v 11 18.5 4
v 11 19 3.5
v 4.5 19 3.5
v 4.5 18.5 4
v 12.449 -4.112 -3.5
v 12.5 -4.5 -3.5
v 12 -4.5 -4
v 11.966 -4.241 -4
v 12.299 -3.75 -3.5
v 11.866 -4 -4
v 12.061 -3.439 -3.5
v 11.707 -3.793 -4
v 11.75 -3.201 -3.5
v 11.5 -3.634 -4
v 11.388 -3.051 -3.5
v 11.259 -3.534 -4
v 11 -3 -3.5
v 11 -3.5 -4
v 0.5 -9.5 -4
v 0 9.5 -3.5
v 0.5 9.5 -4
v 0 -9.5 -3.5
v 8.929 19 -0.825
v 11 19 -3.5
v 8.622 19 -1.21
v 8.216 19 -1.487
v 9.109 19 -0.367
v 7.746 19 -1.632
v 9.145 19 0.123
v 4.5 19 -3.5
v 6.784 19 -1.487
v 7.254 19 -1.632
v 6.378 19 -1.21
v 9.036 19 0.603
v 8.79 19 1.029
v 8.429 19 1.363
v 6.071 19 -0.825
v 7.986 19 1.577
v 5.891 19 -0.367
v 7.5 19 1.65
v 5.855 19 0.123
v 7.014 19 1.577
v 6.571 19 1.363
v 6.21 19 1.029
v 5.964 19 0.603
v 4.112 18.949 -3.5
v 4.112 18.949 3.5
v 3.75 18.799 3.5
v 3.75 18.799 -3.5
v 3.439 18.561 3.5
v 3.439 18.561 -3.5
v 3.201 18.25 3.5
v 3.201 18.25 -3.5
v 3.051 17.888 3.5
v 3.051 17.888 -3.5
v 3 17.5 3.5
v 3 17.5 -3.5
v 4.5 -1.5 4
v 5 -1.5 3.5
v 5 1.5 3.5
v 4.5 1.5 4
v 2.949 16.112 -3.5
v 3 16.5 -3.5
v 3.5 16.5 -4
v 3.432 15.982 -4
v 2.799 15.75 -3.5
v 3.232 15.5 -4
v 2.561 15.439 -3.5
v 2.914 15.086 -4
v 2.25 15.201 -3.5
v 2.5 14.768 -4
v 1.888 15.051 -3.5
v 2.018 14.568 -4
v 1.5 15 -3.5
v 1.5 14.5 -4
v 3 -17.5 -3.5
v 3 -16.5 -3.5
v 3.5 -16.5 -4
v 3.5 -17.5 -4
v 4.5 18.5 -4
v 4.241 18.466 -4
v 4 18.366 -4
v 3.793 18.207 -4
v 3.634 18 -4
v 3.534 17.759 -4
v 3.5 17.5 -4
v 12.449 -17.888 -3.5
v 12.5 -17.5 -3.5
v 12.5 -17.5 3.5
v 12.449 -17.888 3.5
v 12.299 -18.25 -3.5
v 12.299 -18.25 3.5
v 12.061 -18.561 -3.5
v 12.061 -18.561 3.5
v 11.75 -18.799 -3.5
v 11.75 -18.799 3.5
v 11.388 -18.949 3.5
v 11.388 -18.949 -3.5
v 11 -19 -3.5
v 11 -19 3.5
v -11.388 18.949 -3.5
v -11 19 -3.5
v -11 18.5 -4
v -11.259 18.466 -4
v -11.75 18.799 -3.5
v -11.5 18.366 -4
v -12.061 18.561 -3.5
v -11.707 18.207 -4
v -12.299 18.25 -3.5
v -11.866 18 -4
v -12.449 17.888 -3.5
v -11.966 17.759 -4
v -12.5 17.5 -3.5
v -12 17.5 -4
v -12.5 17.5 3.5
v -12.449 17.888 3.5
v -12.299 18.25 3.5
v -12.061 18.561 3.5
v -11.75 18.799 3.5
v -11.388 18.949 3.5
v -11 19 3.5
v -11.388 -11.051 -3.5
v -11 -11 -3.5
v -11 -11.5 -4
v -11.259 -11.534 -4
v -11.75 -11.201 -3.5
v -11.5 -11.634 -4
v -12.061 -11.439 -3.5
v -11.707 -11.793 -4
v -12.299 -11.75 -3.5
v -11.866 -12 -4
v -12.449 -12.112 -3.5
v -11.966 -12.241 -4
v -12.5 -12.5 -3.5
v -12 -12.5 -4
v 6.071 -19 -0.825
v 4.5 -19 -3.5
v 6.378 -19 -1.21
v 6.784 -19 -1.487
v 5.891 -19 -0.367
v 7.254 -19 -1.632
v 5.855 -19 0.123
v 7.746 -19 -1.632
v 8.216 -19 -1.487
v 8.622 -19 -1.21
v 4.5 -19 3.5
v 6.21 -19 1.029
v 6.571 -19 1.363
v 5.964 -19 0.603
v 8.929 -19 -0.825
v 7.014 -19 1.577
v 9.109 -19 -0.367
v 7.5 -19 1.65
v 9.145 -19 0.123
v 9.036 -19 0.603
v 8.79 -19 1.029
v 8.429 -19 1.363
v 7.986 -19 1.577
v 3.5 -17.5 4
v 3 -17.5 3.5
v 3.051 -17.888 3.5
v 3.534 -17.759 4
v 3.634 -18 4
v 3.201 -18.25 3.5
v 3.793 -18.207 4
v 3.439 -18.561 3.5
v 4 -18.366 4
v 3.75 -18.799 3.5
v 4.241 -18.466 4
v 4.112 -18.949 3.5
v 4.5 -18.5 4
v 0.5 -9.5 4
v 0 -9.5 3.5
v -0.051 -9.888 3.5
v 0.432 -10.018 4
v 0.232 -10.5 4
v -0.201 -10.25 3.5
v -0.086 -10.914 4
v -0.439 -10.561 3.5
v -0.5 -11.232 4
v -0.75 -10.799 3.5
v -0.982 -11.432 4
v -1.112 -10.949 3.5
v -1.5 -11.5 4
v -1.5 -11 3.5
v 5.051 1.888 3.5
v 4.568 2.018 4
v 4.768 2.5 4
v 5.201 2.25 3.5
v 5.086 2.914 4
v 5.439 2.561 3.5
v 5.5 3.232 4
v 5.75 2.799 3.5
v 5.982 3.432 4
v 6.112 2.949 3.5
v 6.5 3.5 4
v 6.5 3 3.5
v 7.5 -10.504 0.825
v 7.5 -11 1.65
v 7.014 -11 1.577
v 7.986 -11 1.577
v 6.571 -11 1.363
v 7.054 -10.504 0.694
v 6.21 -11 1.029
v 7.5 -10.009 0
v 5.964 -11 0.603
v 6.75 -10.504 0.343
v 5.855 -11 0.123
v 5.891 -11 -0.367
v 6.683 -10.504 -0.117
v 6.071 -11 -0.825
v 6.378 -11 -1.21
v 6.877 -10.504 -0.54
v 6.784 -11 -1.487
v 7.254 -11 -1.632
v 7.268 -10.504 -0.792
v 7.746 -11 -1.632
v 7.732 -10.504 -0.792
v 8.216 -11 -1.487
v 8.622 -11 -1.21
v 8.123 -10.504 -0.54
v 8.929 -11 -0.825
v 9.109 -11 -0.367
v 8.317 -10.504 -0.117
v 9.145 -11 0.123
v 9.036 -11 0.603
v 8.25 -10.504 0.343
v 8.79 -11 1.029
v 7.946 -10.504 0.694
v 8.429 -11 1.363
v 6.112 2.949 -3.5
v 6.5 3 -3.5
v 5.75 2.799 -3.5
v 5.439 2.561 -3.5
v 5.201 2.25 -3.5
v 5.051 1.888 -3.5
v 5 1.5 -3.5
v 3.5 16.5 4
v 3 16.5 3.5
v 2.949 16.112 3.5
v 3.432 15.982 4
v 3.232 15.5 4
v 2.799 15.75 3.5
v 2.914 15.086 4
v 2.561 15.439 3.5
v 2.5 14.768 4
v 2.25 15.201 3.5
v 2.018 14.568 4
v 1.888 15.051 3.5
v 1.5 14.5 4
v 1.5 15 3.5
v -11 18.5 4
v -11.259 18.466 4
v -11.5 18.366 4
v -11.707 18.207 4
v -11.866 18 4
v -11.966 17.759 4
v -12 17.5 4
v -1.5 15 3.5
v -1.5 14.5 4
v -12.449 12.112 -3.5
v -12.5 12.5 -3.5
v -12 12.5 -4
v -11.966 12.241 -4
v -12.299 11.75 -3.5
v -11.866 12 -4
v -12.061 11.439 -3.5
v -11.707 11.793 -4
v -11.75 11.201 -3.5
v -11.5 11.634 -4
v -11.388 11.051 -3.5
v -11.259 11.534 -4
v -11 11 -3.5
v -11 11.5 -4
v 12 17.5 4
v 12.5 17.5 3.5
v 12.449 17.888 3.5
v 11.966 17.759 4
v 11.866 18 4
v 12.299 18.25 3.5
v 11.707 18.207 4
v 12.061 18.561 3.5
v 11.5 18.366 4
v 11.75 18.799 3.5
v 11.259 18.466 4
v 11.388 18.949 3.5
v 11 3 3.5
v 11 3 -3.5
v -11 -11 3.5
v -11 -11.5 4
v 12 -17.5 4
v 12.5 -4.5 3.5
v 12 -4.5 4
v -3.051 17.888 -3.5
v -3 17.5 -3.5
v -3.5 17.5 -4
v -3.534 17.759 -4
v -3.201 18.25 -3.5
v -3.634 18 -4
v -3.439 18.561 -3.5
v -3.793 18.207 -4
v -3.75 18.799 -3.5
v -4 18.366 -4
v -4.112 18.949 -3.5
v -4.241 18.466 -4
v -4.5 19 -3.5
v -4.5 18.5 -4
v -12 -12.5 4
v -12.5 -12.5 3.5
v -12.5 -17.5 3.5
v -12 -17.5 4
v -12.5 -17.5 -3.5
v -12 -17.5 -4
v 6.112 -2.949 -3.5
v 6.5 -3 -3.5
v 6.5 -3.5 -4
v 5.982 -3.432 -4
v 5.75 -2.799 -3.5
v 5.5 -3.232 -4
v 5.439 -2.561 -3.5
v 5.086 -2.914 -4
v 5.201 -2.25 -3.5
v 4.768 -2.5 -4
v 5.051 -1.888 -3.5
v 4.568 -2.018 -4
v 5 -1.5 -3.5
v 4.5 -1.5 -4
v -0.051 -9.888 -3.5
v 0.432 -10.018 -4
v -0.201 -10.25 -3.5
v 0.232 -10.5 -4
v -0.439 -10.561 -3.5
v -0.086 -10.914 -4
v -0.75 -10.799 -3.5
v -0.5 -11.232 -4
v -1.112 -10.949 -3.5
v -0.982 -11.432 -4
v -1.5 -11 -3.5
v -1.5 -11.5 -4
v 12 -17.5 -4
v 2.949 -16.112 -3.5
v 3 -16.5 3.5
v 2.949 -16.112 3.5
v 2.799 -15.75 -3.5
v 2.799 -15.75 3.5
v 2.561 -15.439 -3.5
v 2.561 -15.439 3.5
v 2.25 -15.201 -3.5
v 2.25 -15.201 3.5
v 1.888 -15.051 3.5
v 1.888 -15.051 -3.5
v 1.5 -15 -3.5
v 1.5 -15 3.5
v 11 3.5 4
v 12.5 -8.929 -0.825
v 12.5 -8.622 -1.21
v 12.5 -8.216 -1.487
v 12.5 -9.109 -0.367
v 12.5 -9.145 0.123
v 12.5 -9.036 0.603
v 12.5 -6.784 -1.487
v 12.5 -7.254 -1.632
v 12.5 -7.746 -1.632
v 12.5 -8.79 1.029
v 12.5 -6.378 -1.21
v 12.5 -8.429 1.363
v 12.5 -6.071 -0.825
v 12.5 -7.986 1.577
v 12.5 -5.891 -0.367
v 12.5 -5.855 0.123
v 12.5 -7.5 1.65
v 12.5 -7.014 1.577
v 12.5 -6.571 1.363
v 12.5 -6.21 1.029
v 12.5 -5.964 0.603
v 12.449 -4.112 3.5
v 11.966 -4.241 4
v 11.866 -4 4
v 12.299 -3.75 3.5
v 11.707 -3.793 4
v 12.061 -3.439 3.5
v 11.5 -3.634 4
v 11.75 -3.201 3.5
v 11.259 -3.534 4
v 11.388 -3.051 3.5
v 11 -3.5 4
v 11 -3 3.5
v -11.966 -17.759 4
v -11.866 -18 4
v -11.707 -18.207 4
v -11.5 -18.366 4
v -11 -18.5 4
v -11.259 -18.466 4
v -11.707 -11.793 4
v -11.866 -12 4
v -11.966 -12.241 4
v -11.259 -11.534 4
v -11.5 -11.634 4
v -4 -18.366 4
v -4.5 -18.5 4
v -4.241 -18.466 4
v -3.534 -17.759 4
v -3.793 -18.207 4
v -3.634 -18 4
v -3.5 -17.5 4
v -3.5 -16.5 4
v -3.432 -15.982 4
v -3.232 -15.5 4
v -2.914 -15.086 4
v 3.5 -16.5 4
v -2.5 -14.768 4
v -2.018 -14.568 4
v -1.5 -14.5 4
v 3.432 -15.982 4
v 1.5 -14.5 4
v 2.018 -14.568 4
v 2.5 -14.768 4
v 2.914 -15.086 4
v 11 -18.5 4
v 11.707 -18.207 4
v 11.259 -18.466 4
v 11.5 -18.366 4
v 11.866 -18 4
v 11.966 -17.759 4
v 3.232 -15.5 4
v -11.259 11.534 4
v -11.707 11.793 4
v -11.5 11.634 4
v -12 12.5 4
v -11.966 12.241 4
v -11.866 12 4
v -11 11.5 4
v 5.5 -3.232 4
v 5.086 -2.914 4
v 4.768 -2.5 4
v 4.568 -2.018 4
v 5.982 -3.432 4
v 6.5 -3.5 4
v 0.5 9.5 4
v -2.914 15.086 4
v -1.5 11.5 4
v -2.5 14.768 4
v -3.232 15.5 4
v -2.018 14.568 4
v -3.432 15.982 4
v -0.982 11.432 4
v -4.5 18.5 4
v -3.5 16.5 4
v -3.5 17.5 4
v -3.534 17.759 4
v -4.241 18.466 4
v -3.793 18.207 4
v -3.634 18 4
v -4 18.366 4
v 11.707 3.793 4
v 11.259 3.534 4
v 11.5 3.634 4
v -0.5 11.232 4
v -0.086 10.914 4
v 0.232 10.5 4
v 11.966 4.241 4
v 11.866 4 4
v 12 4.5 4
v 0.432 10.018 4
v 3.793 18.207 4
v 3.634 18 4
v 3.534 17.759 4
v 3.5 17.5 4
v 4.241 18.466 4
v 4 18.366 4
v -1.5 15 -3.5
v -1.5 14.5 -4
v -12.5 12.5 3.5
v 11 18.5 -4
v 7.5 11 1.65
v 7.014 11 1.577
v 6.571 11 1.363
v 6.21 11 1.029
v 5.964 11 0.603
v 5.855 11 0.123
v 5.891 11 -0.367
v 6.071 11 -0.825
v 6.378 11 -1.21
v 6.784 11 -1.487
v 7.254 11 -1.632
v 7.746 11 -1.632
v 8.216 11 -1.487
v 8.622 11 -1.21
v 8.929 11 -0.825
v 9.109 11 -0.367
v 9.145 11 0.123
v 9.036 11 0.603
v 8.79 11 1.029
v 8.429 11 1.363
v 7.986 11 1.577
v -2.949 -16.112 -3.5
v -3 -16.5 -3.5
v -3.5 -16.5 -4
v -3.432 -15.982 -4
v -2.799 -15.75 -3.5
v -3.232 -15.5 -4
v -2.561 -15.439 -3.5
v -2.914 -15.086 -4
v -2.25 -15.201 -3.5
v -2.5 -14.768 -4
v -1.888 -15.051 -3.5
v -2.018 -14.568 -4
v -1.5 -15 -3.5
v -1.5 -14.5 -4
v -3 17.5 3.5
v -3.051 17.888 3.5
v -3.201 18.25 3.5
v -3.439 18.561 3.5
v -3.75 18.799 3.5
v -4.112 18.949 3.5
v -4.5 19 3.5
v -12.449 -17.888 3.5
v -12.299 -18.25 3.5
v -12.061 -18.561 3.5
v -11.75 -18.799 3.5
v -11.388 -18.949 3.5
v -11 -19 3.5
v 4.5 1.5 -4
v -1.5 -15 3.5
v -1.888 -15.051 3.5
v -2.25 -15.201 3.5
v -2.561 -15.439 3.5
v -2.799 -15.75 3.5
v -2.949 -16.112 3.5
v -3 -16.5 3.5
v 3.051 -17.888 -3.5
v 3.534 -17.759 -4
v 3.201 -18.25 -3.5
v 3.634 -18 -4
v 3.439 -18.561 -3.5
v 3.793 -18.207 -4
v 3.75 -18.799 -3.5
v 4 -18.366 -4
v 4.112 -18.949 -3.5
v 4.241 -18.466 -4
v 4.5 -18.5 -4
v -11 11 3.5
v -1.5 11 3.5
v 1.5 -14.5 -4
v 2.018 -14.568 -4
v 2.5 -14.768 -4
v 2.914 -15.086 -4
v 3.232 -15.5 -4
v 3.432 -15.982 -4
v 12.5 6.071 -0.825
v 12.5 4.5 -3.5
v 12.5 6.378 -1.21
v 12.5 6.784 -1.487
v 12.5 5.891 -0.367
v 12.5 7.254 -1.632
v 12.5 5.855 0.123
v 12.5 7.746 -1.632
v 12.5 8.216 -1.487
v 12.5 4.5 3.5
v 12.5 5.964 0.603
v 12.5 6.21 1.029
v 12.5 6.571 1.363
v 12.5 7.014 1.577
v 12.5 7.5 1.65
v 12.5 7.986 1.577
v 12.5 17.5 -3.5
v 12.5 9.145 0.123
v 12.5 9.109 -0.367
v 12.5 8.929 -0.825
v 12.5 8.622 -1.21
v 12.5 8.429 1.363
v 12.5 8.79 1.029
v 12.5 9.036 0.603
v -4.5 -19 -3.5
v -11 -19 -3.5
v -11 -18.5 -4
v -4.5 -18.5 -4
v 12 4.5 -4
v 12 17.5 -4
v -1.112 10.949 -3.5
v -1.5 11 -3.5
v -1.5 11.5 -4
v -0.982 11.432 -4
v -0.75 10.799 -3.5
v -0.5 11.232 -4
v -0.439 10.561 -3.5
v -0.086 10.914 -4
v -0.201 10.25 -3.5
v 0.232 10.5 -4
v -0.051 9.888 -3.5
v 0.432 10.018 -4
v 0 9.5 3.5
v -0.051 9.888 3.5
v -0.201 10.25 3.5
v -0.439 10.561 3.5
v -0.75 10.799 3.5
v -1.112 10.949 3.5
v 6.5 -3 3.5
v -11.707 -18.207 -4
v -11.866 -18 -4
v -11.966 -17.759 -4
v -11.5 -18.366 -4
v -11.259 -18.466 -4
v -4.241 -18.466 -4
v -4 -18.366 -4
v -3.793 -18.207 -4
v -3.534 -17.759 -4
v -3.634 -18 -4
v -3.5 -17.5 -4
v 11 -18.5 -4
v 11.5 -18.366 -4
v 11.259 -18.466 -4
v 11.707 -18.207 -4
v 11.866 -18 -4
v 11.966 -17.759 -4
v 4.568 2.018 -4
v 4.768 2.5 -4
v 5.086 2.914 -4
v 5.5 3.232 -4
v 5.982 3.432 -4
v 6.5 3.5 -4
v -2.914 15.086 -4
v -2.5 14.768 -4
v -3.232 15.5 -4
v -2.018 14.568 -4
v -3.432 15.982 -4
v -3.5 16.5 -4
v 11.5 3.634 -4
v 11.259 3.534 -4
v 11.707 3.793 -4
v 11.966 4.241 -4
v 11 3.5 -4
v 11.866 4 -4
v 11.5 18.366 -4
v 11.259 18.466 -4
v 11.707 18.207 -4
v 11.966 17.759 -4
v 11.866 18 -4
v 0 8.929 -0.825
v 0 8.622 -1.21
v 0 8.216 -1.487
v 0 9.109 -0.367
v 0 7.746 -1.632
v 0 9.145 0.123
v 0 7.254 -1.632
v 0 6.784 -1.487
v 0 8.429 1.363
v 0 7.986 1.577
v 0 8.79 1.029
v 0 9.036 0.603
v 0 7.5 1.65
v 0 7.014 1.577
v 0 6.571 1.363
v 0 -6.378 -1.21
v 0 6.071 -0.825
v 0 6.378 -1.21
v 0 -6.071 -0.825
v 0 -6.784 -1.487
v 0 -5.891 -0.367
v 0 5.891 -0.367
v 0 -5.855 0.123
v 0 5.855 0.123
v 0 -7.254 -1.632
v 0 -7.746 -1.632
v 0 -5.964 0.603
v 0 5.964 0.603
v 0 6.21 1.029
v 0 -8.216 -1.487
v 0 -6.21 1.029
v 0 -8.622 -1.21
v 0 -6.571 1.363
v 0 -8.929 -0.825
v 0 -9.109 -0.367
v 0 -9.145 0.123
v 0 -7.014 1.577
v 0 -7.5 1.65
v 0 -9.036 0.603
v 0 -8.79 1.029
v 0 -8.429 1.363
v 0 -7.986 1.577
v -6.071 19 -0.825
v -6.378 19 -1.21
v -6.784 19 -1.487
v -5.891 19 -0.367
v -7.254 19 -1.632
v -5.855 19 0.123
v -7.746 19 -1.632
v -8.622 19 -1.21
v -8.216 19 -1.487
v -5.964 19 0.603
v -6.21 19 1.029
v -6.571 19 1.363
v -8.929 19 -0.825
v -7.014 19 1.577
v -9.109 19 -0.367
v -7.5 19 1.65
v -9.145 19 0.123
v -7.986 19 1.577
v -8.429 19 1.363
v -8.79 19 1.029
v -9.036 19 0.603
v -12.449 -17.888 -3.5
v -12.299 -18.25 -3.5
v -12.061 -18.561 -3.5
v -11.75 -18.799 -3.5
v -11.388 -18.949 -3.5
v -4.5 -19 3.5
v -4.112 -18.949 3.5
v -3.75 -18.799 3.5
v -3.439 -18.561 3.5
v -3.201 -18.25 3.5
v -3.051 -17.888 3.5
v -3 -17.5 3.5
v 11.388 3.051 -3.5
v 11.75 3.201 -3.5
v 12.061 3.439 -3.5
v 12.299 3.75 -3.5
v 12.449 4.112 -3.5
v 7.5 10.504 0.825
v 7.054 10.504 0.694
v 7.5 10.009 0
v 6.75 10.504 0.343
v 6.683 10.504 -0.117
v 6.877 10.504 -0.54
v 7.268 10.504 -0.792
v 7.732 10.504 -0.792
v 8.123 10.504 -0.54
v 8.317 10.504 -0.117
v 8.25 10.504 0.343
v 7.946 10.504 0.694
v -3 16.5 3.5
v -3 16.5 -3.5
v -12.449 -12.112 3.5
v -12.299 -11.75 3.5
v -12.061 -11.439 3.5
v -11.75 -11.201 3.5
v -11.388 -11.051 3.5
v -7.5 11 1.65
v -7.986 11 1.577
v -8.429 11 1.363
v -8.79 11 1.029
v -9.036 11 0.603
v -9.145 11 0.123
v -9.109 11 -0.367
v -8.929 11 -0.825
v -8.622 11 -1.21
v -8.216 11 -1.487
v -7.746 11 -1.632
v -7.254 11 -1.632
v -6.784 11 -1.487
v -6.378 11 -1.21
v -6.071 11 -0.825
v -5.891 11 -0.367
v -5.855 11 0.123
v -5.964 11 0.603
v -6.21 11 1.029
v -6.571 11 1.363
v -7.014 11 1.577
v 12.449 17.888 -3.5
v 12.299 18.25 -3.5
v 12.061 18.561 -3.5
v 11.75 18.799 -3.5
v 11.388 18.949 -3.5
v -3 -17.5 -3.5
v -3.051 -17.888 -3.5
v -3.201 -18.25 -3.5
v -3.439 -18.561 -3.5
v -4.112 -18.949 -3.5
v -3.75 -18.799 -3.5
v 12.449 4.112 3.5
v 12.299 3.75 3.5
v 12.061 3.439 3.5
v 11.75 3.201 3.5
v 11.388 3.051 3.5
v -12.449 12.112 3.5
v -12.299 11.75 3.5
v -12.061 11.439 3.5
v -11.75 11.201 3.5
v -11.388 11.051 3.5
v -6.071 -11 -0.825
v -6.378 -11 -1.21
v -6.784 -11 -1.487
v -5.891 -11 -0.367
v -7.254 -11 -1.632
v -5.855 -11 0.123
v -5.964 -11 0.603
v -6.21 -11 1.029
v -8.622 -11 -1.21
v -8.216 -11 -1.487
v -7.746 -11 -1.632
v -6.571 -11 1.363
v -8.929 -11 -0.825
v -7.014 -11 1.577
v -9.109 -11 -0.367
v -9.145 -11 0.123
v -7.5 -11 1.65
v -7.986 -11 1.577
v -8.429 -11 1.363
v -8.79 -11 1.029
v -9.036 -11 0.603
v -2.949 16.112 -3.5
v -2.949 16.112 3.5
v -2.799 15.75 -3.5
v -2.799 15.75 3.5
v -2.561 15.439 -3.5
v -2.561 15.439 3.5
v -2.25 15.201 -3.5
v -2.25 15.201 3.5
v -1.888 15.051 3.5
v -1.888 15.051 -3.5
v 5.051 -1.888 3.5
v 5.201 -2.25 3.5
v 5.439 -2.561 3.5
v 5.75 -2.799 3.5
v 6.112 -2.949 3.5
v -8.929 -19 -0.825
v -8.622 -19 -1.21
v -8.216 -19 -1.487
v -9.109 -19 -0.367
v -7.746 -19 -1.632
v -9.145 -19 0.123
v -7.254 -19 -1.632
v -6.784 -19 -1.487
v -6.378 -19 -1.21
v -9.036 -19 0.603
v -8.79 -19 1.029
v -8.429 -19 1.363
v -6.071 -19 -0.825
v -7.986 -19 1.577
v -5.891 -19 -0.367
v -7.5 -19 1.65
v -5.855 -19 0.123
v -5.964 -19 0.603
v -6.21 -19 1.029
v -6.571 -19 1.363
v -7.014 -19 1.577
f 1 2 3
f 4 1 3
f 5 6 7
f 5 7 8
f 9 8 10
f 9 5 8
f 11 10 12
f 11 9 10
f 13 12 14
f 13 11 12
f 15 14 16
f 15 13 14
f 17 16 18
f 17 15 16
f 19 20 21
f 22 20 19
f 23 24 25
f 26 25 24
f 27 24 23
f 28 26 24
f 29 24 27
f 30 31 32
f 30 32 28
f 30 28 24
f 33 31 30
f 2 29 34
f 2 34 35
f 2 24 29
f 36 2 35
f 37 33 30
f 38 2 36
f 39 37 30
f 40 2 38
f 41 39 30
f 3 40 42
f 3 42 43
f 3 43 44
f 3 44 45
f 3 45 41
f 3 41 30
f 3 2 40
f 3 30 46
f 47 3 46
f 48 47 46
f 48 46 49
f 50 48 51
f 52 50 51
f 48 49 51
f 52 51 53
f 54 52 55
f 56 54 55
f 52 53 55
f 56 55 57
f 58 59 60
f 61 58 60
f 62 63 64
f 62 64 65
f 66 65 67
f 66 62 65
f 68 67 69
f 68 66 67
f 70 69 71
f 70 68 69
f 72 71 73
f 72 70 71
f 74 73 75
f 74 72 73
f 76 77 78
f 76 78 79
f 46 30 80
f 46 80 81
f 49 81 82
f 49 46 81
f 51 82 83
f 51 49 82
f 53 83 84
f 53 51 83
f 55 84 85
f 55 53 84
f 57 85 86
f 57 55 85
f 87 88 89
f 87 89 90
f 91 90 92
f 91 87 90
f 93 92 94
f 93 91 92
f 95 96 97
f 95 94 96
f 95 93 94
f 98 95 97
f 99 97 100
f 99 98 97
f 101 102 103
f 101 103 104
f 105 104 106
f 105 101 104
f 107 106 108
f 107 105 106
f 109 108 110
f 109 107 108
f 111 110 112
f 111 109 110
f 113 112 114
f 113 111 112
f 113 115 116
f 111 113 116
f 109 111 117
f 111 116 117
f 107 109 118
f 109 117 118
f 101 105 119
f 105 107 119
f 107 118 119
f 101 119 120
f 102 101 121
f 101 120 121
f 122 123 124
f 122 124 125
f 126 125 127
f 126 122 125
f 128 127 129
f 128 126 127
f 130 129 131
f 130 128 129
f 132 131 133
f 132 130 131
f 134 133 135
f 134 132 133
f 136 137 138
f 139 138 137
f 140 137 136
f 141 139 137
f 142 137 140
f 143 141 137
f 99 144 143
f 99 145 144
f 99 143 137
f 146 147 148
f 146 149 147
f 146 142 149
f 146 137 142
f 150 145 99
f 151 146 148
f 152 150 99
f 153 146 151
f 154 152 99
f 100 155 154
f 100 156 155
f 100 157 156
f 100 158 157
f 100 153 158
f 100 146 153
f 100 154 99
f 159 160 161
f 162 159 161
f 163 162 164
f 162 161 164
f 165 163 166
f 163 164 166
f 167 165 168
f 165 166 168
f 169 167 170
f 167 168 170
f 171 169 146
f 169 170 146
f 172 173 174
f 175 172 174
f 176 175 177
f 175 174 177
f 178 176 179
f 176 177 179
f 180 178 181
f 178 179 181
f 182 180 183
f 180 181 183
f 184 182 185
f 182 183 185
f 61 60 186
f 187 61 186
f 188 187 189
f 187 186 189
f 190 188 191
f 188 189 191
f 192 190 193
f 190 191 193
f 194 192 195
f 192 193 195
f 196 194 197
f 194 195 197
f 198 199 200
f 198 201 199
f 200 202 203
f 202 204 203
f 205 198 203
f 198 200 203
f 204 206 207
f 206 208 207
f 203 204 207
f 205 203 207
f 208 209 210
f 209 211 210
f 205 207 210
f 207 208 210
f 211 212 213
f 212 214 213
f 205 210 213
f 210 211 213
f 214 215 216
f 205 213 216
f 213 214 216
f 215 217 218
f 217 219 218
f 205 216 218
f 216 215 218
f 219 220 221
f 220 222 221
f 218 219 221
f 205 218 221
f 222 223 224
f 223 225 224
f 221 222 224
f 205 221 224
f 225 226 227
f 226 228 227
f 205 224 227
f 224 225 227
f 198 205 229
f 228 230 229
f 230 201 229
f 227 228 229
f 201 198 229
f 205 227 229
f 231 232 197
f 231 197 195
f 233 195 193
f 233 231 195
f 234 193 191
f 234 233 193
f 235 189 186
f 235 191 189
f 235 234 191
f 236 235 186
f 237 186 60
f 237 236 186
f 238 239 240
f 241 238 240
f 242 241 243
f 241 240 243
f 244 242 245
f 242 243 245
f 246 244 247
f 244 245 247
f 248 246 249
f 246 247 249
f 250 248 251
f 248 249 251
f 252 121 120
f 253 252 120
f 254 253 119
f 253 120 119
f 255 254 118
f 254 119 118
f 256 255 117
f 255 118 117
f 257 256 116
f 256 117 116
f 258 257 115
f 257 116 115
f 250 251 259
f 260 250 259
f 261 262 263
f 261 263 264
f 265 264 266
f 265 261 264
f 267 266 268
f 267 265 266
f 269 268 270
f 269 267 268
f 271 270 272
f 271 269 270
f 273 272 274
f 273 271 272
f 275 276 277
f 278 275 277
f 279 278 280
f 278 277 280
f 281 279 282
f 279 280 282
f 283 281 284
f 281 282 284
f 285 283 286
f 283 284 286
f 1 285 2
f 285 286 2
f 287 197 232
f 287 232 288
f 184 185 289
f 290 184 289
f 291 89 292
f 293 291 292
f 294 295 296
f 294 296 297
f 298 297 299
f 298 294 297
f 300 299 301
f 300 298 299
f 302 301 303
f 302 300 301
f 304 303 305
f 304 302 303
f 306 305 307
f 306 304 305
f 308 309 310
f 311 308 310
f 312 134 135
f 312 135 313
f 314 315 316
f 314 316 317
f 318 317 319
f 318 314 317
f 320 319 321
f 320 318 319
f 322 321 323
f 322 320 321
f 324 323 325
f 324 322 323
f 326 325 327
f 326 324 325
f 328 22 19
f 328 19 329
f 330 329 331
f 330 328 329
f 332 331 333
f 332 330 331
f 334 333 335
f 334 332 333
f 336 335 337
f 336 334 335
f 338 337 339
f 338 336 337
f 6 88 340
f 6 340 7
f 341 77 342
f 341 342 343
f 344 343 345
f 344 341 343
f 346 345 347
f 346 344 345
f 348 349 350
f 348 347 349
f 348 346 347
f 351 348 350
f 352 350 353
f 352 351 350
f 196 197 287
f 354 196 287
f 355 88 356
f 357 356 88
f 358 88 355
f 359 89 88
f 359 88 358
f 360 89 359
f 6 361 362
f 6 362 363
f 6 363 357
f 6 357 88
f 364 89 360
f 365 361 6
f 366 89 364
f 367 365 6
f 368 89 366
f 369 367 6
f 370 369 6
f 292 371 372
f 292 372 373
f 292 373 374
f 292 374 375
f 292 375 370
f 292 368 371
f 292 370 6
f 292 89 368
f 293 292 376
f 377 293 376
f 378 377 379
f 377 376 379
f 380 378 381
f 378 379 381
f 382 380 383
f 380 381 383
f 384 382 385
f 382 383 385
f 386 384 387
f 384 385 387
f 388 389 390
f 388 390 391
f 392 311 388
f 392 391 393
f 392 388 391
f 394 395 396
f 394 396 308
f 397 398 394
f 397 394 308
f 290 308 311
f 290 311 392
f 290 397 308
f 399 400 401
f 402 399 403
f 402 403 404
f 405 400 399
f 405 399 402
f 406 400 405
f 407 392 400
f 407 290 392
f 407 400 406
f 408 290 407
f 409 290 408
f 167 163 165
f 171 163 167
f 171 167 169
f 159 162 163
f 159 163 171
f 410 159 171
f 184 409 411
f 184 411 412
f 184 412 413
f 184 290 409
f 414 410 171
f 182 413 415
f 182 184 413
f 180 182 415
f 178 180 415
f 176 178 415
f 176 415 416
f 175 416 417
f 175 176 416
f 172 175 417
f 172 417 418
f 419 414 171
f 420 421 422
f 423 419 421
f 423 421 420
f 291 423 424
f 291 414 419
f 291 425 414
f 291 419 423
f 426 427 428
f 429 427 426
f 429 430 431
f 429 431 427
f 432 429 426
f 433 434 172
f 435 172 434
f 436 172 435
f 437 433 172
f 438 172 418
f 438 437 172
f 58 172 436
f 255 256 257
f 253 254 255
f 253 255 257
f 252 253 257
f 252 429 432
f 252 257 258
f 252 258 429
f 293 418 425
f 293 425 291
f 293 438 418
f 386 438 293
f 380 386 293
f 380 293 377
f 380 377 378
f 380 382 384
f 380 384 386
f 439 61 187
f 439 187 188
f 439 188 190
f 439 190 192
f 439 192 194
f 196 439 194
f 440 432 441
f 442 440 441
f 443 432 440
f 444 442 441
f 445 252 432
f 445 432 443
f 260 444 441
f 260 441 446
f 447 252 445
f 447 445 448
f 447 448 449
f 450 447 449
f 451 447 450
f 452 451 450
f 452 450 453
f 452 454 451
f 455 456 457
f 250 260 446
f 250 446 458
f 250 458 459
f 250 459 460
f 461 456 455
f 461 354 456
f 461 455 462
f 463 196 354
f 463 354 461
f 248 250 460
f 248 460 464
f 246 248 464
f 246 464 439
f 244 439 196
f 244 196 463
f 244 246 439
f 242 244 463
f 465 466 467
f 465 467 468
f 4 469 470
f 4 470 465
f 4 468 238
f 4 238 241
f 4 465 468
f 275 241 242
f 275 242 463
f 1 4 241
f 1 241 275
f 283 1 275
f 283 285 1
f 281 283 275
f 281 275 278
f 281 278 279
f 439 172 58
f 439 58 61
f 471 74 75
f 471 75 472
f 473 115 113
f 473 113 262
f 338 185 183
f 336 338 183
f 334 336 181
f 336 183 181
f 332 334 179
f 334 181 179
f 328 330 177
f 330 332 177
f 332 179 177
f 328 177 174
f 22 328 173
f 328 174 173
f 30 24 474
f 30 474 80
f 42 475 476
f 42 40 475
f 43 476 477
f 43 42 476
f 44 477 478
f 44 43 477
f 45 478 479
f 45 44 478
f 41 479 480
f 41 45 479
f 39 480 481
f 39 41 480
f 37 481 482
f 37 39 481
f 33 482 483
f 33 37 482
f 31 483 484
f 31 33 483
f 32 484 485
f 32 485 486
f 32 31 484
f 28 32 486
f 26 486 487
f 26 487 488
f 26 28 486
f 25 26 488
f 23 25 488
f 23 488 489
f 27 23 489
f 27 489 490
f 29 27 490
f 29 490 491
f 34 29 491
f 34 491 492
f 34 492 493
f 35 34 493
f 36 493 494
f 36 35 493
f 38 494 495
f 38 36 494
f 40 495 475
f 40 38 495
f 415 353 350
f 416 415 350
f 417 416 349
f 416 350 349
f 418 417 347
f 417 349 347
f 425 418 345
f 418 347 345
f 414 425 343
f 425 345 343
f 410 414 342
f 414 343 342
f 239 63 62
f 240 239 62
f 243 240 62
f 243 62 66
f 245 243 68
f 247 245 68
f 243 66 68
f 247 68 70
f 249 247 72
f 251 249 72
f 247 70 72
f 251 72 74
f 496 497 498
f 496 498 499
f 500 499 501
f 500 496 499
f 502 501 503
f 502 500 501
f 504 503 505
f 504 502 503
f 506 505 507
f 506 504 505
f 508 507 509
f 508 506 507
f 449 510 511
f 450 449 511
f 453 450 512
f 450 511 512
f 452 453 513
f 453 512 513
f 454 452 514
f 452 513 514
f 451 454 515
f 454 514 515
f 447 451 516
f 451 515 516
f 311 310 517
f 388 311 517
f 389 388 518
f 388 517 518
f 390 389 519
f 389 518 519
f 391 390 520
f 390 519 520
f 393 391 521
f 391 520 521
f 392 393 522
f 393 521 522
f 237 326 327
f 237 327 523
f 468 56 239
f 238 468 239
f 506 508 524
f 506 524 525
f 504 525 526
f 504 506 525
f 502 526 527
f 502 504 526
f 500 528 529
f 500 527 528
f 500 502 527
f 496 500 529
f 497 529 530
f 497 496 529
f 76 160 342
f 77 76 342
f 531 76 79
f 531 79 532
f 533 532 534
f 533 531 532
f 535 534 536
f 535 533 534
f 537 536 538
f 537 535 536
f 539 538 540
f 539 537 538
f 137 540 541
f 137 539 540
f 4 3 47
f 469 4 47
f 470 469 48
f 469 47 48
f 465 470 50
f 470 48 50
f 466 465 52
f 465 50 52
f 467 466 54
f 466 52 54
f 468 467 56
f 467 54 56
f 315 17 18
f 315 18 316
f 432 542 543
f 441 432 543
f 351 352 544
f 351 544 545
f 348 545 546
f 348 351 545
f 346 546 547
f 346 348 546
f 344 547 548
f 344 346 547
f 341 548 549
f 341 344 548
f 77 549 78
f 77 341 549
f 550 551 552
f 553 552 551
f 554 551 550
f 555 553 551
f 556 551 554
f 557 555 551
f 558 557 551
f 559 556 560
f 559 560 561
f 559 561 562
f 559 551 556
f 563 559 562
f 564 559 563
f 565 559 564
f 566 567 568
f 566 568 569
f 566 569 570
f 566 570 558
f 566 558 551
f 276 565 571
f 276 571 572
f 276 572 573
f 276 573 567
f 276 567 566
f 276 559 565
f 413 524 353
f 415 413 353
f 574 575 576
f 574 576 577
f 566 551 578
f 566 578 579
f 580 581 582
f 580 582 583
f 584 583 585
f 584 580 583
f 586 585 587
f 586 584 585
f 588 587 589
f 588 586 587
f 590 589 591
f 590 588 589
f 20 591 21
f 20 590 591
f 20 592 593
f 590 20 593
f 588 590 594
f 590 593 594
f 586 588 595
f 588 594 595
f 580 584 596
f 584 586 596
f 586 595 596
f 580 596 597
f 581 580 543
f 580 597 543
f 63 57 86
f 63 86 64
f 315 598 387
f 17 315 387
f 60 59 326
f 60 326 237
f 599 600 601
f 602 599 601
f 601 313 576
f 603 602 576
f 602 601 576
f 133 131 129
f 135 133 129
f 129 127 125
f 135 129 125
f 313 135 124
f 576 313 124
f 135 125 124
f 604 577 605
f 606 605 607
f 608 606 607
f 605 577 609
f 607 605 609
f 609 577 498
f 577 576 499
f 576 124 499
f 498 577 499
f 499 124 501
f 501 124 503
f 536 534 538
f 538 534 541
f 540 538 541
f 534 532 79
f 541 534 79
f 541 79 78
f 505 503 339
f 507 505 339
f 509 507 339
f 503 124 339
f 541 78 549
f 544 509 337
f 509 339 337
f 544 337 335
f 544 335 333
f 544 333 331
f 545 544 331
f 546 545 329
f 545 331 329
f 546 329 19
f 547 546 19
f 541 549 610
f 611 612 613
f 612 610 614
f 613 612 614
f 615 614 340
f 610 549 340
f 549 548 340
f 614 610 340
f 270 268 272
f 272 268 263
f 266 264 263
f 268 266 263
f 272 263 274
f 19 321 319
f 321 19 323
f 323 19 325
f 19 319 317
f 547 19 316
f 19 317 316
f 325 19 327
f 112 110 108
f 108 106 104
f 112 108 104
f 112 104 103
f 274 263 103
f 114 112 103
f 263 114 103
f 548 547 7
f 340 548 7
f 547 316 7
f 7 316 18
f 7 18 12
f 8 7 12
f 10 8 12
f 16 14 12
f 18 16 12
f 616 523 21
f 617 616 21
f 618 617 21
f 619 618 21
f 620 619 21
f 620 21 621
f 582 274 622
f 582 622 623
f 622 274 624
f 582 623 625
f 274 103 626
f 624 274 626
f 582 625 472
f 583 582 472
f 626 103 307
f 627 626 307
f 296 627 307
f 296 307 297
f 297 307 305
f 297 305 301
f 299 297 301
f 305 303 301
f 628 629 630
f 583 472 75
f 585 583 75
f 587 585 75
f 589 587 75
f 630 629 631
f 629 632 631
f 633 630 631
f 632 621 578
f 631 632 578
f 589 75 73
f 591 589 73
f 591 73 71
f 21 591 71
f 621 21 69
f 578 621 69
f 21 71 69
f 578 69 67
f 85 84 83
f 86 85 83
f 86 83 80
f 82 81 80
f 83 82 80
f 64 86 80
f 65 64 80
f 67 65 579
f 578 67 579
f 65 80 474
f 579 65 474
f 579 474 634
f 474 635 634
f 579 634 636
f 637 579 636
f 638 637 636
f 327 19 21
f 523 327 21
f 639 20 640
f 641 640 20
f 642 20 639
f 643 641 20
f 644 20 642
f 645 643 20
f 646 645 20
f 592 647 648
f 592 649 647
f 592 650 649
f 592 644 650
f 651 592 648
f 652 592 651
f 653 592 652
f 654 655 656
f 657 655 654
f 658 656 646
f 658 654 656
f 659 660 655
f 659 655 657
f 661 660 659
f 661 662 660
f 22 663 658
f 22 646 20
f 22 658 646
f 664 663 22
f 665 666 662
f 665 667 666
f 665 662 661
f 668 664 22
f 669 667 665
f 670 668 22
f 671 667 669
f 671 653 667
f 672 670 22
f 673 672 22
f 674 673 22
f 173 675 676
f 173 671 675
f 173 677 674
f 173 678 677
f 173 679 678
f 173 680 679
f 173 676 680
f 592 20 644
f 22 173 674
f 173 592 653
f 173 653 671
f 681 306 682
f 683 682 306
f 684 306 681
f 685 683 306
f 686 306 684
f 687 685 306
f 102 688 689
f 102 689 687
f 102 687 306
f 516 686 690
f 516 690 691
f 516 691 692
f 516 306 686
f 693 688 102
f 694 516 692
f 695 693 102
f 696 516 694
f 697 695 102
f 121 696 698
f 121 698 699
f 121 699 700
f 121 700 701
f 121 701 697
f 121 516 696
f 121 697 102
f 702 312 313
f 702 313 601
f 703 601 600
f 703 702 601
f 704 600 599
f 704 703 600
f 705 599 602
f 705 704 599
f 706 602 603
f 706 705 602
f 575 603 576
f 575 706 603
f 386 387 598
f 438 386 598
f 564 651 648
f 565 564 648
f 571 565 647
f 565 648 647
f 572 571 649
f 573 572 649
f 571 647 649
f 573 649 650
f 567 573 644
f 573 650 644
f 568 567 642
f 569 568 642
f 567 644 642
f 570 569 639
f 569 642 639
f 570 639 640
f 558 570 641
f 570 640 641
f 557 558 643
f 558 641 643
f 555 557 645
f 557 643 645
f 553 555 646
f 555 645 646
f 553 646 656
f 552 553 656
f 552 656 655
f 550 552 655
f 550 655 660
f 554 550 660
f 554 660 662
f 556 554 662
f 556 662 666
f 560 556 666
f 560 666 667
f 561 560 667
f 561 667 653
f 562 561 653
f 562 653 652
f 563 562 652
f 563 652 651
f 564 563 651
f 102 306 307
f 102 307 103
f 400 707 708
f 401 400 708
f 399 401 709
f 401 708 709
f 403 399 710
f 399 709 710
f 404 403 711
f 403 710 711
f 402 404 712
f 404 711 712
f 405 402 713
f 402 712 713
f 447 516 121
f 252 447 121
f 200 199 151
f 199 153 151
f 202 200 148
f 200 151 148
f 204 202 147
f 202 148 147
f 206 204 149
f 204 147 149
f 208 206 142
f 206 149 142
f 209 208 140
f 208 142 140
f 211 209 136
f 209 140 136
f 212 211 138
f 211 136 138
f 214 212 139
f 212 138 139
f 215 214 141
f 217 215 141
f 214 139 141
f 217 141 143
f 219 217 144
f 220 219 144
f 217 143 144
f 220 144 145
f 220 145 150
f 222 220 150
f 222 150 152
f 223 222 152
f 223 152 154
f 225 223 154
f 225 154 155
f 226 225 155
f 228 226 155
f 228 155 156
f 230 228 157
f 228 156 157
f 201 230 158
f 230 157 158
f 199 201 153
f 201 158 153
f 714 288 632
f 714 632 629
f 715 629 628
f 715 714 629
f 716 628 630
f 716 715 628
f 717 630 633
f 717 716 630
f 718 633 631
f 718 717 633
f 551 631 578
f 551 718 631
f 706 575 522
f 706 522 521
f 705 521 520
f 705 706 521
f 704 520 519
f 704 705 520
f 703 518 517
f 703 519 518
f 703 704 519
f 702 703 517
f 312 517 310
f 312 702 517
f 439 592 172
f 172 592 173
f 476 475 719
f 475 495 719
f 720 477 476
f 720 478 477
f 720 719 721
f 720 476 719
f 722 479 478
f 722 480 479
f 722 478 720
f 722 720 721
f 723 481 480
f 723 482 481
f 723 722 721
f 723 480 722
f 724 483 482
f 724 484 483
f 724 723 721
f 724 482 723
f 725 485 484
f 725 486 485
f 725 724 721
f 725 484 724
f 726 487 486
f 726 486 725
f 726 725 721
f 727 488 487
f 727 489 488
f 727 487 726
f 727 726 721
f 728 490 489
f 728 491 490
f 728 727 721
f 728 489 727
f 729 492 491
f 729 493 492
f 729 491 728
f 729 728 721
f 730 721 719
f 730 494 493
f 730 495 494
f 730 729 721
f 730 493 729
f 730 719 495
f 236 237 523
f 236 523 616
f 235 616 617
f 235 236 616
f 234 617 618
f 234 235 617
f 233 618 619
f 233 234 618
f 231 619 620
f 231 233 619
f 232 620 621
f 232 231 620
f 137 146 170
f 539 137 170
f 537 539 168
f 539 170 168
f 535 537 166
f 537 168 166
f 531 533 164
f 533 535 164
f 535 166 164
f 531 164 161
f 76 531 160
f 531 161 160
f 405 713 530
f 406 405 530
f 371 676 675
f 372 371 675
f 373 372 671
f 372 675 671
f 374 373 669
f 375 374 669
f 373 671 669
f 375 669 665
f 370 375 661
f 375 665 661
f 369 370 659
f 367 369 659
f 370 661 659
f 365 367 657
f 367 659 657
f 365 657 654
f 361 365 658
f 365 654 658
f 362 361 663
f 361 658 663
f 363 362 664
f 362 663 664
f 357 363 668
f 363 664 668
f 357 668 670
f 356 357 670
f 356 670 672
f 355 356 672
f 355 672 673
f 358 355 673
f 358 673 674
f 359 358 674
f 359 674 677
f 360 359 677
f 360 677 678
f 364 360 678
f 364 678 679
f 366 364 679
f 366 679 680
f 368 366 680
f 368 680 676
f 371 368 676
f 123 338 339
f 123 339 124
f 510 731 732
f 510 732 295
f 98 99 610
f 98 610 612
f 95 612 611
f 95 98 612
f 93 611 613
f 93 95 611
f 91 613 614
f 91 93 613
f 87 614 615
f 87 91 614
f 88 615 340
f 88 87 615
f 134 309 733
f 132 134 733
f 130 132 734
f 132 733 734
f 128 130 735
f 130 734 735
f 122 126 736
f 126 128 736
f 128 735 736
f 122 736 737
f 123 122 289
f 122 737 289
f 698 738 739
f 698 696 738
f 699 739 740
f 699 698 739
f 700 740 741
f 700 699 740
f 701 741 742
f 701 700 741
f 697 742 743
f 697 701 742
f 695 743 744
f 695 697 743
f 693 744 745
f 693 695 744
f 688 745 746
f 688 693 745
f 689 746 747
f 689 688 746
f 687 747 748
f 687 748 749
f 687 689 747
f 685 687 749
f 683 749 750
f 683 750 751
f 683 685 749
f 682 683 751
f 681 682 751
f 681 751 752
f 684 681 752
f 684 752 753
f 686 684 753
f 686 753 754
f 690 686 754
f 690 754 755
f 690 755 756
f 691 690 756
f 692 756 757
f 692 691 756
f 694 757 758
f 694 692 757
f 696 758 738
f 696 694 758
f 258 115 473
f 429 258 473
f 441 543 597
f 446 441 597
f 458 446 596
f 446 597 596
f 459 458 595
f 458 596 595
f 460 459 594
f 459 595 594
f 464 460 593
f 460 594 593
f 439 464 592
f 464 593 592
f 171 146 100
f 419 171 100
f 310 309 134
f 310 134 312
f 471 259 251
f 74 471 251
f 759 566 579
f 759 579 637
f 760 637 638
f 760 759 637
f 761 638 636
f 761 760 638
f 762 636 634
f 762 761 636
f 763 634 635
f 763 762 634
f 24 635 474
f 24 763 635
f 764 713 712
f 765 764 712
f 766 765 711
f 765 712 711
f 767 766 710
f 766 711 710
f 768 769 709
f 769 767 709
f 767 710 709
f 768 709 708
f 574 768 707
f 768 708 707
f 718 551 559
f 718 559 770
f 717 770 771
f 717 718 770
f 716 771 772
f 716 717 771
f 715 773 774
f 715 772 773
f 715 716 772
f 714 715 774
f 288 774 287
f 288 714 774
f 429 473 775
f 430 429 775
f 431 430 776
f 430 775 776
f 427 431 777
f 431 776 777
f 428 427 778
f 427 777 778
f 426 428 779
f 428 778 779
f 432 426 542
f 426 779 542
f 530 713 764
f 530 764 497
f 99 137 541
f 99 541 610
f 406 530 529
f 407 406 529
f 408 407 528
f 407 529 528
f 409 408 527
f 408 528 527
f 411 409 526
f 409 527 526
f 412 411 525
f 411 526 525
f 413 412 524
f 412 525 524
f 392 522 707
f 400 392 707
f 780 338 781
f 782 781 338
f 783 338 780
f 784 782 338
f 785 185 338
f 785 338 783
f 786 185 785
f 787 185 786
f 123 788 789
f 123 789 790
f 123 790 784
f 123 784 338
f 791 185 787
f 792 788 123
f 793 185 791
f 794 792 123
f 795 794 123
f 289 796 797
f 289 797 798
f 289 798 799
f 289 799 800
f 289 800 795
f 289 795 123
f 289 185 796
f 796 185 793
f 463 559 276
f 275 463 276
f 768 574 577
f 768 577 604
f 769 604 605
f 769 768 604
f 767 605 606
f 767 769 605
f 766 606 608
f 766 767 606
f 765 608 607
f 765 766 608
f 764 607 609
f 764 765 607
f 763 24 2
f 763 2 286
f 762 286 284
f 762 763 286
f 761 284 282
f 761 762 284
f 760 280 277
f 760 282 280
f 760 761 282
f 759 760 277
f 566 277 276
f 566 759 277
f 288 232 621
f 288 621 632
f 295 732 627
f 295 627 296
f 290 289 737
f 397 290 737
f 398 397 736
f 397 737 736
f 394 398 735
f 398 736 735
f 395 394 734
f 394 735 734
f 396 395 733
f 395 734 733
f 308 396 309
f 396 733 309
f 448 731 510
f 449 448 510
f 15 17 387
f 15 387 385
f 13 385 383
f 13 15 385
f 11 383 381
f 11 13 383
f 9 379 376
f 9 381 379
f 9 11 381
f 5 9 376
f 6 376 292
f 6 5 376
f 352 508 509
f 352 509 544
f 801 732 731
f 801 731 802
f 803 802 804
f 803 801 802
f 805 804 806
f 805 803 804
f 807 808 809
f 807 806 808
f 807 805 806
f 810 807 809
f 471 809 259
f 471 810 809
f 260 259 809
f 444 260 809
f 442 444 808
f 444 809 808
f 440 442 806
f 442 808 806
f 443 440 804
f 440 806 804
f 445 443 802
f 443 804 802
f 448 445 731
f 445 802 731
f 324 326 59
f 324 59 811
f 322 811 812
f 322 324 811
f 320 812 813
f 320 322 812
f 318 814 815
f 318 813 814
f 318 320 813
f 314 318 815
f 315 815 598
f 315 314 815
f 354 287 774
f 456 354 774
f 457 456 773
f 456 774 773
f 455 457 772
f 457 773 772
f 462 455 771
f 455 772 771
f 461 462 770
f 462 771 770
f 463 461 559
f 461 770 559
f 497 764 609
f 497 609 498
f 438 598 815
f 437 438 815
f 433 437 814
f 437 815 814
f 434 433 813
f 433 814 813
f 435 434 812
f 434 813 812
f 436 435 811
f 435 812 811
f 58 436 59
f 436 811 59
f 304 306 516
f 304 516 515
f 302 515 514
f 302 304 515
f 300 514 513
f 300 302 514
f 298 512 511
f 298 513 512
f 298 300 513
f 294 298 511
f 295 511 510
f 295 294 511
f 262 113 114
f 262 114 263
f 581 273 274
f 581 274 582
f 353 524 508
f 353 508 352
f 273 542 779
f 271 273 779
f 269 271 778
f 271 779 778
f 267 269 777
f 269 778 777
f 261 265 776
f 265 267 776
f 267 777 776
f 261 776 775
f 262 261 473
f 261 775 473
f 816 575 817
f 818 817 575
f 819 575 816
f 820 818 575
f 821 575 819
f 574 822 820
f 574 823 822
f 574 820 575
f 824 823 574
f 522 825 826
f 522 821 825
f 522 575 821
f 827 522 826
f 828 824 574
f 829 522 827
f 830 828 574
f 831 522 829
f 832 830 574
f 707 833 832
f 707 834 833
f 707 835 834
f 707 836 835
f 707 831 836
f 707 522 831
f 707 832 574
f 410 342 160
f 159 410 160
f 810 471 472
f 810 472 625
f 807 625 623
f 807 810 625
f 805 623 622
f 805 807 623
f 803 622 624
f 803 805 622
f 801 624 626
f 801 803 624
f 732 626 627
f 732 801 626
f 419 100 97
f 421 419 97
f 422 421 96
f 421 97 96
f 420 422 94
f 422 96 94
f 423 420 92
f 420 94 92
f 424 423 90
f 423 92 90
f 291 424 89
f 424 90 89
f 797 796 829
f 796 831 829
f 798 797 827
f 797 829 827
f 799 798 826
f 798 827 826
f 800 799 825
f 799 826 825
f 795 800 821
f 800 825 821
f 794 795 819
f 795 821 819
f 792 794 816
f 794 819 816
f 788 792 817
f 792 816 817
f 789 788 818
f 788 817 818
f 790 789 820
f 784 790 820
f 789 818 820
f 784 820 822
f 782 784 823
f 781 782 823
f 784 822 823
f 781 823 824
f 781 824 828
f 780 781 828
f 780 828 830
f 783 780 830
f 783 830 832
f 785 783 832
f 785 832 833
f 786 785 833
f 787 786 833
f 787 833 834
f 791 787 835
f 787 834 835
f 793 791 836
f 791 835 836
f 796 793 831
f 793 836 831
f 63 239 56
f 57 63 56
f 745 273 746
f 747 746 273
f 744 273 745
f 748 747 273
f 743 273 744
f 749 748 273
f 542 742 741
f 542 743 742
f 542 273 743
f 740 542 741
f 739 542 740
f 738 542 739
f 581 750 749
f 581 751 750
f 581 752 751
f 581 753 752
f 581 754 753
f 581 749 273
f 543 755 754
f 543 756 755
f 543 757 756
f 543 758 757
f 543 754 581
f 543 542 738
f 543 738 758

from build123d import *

# Parameters (mm, degrees)
EXTRUDE_1_DEPTH             = 4
SKETCH_2_R                  = 1.5
CUT_EXTRUDE_1_DEPTH         = 8
SKETCH_3_R                  = 1.5
CUT_EXTRUDE_2_DEPTH         = 24.092206478
HOLE_WIZARD_M4_1_D          = 3.3
HOLE_WIZARD_M4_2_AT_2_COUNT = 2
HOLE_WIZARD_M4_2_AT_2_PITCH = 15
SKETCH_9_W                  = 15
SKETCH_9_H                  = 6
SKETCH_9_W_2                = 6
SKETCH_9_H_2                = 8
CUT_EXTRUDE_3_DEPTH         = 25.109126902
FILLET_1_R                  = 1.5
CHAMFER_1_SIZE              = 0.5


with BuildPart() as part:
    # 草图1 → 凸台-拉伸1 (new, symmetric)
    with BuildSketch(Plane.XY):
        Polygon((12.5, 19), (-12.5, 19), (-12.5, 11), (0, 11), (0, -11), (-12.5, -11), (-12.5, -19), (12.5, -19), align=None)
    extrude(amount=EXTRUDE_1_DEPTH, both=True)

    # 草图2 → 切除-拉伸1 (cut)
    with BuildSketch(Plane(origin=(0, 19, 0), x_dir=(1, 0, 0), z_dir=(0, 1, 0))):
        with Locations(Location((-7.5, 0, 0), (0, 0, 270))):
            Circle(SKETCH_2_R)
        with Locations(Location((7.5, 0, 0), (0, 0, 270))):
            Circle(SKETCH_2_R)
    extrude(amount=-CUT_EXTRUDE_1_DEPTH, mode=Mode.SUBTRACT)

    # 草图3 → 切除-拉伸2 (cut, through all)
    with BuildSketch(Plane.ZY):
        with Locations((0, 7.5)):
            Circle(SKETCH_3_R)
        with Locations((0, -7.5)):
            Circle(SKETCH_3_R)
    extrude(amount=-CUT_EXTRUDE_2_DEPTH, mode=Mode.SUBTRACT)

    # M4 螺纹孔1 (through all)
    with Locations(Plane(origin=(12.5, 0, 0), x_dir=(0, 0, -1), z_dir=(1, 0, 0))):
        with Locations((0, 7.5), (0, -7.5)):
            Hole(HOLE_WIZARD_M4_1_D / 2)

    # 草图8 → M4 螺纹孔2 (revolve, cut)
    with BuildSketch(Plane(origin=(-7.5, 19, 0), x_dir=(0, 0, 1), z_dir=(1, 0, 0))):
        Polygon((0, 0), (0, 8.991420021), (1.65, 8), (1.65, 0), align=None)
    hole_wizard_m4_2 = revolve(axis=Axis((-7.5, 25.35, 0), (0, -1, 0)), mode=Mode.SUBTRACT)

    # M4 螺纹孔2 at 2: M4 螺纹孔2 ×2
    with Locations(*[(i * HOLE_WIZARD_M4_2_AT_2_PITCH, 0, 0) for i in range(1, HOLE_WIZARD_M4_2_AT_2_COUNT)]):
        add(hole_wizard_m4_2, mode=Mode.SUBTRACT)

    # 镜向1: M4 螺纹孔2 across plane
    add(hole_wizard_m4_2.mirror(Plane.ZX), mode=Mode.SUBTRACT)

    # 镜向1 copy 1 sketch → 镜向1 copy 1 (revolve, cut)
    with BuildSketch(Plane(origin=(7.5, -19, 0), x_dir=(0, 0, 1), z_dir=(1, 0, 0))):
        Polygon((0, 0), (0, -8.991420021), (1.65, -8), (1.65, 0), align=None)
    revolve(axis=Axis((7.5, -25.35, 0), (0, -1, 0)), mode=Mode.SUBTRACT)

    # 草图9 → 切除-拉伸3 (cut, through all)
    with BuildSketch(Plane.XY.offset(4)):
        with Locations((12.5, 0)):
            Rectangle(SKETCH_9_W, SKETCH_9_H)
        with Locations((0, 19)):
            Rectangle(SKETCH_9_W_2, SKETCH_9_H_2)
        with Locations((0, -19)):
            Rectangle(SKETCH_9_W_2, SKETCH_9_H_2)
    extrude(amount=-CUT_EXTRUDE_3_DEPTH, mode=Mode.SUBTRACT)

    # 圆角1
    fillet_1_edges = [part.edges().sort_by_distance(p)[0] for p in [
        (3, 19, 0),
        (-3, 19, 0),
        (3, 15, 0),
        (-3, 15, 0),
        (3, -19, 0),
        (3, -15, 0),
        (-3, -19, 0),
        (-3, -15, 0),
        (-12.5, 11, 0),
        (-12.5, 19, 0),
        (12.5, 19, 0),
        (12.5, -19, 0),
        (-12.5, -19, 0),
        (-12.5, -11, 0),
        (0, -11, 0),
        (0, 11, 0),
        (12.5, 3, 0),
        (12.5, -3, 0),
        (5, -3, 0),
        (5, 3, 0),
    ]]
    fillet(fillet_1_edges, radius=FILLET_1_R)

    # 倒角1
    chamfer_1_edges = [part.edges().sort_by_distance(p)[0] for p in [
        (7.75, -19, 4),
        (7.75, -19, -4),
        (12.5, 11, -4),
        (8.75, 3, -4),
        (5, 0, -4),
        (8.75, -3, -4),
        (12.5, -11, -4),
        (3, -17, -4),
        (0, -15, -4),
        (-3, -17, -4),
        (-7.75, -19, -4),
        (-12.5, -15, -4),
        (-6.25, -11, -4),
        (0, 0, -4),
        (-6.25, 11, -4),
        (-12.5, 15, -4),
        (-7.75, 19, -4),
        (-3, 17, -4),
        (0, 15, -4),
        (3, 17, -4),
        (7.75, 19, -4),
        (-12.060660172, 11.439339828, -4),
        (-12.060660172, -11.439339828, -4),
        (-12.060660172, -18.560660172, -4),
        (12.060660172, -18.560660172, -4),
        (12.060660172, 18.560660172, -4),
        (-12.060660172, 18.560660172, -4),
        (12.060660172, -3.439339828, -4),
        (12.060660172, 3.439339828, -4),
        (3.439339828, 18.560660172, -4),
        (-3.439339828, 18.560660172, -4),
        (-3.439339828, -18.560660172, -4),
        (3.439339828, -18.560660172, -4),
        (3, -17, 4),
        (8.75, 3, 4),
        (12.5, 11, 4),
        (7.75, 19, 4),
        (3, 17, 4),
        (0, 15, 4),
        (-3, 17, 4),
        (-7.75, 19, 4),
        (-12.5, 15, 4),
        (-6.25, 11, 4),
        (0, 0, 4),
        (-6.25, -11, 4),
        (-12.5, -15, 4),
        (-7.75, -19, 4),
        (-3, -17, 4),
        (0, -15, 4),
        (12.5, -11, 4),
        (8.75, -3, 4),
        (5, 0, 4),
        (-12.060660172, 11.439339828, 4),
        (-12.060660172, -11.439339828, 4),
        (-12.060660172, -18.560660172, 4),
        (12.060660172, -18.560660172, 4),
        (12.060660172, 18.560660172, 4),
        (-12.060660172, 18.560660172, 4),
        (12.060660172, -3.439339828, 4),
        (12.060660172, 3.439339828, 4),
        (3.439339828, 18.560660172, 4),
        (-3.439339828, 18.560660172, 4),
        (-3.439339828, -18.560660172, 4),
        (3.439339828, -18.560660172, 4),
        (2.560660172, -15.439339828, 4),
        (2.560660172, -15.439339828, -4),
        (-2.560660172, -15.439339828, 4),
        (-2.560660172, -15.439339828, -4),
        (-2.560660172, 15.439339828, 4),
        (-2.560660172, 15.439339828, -4),
        (2.560660172, 15.439339828, 4),
        (2.560660172, 15.439339828, -4),
        (5.439339828, 2.560660172, 4),
        (5.439339828, 2.560660172, -4),
        (5.439339828, -2.560660172, 4),
        (5.439339828, -2.560660172, -4),
        (-0.439339828, -10.560660172, -4),
        (-0.439339828, -10.560660172, 4),
        (-0.439339828, 10.560660172, -4),
        (-0.439339828, 10.560660172, 4),
    ]]
    chamfer(chamfer_1_edges, length=CHAMFER_1_SIZE)


solid = part.part
